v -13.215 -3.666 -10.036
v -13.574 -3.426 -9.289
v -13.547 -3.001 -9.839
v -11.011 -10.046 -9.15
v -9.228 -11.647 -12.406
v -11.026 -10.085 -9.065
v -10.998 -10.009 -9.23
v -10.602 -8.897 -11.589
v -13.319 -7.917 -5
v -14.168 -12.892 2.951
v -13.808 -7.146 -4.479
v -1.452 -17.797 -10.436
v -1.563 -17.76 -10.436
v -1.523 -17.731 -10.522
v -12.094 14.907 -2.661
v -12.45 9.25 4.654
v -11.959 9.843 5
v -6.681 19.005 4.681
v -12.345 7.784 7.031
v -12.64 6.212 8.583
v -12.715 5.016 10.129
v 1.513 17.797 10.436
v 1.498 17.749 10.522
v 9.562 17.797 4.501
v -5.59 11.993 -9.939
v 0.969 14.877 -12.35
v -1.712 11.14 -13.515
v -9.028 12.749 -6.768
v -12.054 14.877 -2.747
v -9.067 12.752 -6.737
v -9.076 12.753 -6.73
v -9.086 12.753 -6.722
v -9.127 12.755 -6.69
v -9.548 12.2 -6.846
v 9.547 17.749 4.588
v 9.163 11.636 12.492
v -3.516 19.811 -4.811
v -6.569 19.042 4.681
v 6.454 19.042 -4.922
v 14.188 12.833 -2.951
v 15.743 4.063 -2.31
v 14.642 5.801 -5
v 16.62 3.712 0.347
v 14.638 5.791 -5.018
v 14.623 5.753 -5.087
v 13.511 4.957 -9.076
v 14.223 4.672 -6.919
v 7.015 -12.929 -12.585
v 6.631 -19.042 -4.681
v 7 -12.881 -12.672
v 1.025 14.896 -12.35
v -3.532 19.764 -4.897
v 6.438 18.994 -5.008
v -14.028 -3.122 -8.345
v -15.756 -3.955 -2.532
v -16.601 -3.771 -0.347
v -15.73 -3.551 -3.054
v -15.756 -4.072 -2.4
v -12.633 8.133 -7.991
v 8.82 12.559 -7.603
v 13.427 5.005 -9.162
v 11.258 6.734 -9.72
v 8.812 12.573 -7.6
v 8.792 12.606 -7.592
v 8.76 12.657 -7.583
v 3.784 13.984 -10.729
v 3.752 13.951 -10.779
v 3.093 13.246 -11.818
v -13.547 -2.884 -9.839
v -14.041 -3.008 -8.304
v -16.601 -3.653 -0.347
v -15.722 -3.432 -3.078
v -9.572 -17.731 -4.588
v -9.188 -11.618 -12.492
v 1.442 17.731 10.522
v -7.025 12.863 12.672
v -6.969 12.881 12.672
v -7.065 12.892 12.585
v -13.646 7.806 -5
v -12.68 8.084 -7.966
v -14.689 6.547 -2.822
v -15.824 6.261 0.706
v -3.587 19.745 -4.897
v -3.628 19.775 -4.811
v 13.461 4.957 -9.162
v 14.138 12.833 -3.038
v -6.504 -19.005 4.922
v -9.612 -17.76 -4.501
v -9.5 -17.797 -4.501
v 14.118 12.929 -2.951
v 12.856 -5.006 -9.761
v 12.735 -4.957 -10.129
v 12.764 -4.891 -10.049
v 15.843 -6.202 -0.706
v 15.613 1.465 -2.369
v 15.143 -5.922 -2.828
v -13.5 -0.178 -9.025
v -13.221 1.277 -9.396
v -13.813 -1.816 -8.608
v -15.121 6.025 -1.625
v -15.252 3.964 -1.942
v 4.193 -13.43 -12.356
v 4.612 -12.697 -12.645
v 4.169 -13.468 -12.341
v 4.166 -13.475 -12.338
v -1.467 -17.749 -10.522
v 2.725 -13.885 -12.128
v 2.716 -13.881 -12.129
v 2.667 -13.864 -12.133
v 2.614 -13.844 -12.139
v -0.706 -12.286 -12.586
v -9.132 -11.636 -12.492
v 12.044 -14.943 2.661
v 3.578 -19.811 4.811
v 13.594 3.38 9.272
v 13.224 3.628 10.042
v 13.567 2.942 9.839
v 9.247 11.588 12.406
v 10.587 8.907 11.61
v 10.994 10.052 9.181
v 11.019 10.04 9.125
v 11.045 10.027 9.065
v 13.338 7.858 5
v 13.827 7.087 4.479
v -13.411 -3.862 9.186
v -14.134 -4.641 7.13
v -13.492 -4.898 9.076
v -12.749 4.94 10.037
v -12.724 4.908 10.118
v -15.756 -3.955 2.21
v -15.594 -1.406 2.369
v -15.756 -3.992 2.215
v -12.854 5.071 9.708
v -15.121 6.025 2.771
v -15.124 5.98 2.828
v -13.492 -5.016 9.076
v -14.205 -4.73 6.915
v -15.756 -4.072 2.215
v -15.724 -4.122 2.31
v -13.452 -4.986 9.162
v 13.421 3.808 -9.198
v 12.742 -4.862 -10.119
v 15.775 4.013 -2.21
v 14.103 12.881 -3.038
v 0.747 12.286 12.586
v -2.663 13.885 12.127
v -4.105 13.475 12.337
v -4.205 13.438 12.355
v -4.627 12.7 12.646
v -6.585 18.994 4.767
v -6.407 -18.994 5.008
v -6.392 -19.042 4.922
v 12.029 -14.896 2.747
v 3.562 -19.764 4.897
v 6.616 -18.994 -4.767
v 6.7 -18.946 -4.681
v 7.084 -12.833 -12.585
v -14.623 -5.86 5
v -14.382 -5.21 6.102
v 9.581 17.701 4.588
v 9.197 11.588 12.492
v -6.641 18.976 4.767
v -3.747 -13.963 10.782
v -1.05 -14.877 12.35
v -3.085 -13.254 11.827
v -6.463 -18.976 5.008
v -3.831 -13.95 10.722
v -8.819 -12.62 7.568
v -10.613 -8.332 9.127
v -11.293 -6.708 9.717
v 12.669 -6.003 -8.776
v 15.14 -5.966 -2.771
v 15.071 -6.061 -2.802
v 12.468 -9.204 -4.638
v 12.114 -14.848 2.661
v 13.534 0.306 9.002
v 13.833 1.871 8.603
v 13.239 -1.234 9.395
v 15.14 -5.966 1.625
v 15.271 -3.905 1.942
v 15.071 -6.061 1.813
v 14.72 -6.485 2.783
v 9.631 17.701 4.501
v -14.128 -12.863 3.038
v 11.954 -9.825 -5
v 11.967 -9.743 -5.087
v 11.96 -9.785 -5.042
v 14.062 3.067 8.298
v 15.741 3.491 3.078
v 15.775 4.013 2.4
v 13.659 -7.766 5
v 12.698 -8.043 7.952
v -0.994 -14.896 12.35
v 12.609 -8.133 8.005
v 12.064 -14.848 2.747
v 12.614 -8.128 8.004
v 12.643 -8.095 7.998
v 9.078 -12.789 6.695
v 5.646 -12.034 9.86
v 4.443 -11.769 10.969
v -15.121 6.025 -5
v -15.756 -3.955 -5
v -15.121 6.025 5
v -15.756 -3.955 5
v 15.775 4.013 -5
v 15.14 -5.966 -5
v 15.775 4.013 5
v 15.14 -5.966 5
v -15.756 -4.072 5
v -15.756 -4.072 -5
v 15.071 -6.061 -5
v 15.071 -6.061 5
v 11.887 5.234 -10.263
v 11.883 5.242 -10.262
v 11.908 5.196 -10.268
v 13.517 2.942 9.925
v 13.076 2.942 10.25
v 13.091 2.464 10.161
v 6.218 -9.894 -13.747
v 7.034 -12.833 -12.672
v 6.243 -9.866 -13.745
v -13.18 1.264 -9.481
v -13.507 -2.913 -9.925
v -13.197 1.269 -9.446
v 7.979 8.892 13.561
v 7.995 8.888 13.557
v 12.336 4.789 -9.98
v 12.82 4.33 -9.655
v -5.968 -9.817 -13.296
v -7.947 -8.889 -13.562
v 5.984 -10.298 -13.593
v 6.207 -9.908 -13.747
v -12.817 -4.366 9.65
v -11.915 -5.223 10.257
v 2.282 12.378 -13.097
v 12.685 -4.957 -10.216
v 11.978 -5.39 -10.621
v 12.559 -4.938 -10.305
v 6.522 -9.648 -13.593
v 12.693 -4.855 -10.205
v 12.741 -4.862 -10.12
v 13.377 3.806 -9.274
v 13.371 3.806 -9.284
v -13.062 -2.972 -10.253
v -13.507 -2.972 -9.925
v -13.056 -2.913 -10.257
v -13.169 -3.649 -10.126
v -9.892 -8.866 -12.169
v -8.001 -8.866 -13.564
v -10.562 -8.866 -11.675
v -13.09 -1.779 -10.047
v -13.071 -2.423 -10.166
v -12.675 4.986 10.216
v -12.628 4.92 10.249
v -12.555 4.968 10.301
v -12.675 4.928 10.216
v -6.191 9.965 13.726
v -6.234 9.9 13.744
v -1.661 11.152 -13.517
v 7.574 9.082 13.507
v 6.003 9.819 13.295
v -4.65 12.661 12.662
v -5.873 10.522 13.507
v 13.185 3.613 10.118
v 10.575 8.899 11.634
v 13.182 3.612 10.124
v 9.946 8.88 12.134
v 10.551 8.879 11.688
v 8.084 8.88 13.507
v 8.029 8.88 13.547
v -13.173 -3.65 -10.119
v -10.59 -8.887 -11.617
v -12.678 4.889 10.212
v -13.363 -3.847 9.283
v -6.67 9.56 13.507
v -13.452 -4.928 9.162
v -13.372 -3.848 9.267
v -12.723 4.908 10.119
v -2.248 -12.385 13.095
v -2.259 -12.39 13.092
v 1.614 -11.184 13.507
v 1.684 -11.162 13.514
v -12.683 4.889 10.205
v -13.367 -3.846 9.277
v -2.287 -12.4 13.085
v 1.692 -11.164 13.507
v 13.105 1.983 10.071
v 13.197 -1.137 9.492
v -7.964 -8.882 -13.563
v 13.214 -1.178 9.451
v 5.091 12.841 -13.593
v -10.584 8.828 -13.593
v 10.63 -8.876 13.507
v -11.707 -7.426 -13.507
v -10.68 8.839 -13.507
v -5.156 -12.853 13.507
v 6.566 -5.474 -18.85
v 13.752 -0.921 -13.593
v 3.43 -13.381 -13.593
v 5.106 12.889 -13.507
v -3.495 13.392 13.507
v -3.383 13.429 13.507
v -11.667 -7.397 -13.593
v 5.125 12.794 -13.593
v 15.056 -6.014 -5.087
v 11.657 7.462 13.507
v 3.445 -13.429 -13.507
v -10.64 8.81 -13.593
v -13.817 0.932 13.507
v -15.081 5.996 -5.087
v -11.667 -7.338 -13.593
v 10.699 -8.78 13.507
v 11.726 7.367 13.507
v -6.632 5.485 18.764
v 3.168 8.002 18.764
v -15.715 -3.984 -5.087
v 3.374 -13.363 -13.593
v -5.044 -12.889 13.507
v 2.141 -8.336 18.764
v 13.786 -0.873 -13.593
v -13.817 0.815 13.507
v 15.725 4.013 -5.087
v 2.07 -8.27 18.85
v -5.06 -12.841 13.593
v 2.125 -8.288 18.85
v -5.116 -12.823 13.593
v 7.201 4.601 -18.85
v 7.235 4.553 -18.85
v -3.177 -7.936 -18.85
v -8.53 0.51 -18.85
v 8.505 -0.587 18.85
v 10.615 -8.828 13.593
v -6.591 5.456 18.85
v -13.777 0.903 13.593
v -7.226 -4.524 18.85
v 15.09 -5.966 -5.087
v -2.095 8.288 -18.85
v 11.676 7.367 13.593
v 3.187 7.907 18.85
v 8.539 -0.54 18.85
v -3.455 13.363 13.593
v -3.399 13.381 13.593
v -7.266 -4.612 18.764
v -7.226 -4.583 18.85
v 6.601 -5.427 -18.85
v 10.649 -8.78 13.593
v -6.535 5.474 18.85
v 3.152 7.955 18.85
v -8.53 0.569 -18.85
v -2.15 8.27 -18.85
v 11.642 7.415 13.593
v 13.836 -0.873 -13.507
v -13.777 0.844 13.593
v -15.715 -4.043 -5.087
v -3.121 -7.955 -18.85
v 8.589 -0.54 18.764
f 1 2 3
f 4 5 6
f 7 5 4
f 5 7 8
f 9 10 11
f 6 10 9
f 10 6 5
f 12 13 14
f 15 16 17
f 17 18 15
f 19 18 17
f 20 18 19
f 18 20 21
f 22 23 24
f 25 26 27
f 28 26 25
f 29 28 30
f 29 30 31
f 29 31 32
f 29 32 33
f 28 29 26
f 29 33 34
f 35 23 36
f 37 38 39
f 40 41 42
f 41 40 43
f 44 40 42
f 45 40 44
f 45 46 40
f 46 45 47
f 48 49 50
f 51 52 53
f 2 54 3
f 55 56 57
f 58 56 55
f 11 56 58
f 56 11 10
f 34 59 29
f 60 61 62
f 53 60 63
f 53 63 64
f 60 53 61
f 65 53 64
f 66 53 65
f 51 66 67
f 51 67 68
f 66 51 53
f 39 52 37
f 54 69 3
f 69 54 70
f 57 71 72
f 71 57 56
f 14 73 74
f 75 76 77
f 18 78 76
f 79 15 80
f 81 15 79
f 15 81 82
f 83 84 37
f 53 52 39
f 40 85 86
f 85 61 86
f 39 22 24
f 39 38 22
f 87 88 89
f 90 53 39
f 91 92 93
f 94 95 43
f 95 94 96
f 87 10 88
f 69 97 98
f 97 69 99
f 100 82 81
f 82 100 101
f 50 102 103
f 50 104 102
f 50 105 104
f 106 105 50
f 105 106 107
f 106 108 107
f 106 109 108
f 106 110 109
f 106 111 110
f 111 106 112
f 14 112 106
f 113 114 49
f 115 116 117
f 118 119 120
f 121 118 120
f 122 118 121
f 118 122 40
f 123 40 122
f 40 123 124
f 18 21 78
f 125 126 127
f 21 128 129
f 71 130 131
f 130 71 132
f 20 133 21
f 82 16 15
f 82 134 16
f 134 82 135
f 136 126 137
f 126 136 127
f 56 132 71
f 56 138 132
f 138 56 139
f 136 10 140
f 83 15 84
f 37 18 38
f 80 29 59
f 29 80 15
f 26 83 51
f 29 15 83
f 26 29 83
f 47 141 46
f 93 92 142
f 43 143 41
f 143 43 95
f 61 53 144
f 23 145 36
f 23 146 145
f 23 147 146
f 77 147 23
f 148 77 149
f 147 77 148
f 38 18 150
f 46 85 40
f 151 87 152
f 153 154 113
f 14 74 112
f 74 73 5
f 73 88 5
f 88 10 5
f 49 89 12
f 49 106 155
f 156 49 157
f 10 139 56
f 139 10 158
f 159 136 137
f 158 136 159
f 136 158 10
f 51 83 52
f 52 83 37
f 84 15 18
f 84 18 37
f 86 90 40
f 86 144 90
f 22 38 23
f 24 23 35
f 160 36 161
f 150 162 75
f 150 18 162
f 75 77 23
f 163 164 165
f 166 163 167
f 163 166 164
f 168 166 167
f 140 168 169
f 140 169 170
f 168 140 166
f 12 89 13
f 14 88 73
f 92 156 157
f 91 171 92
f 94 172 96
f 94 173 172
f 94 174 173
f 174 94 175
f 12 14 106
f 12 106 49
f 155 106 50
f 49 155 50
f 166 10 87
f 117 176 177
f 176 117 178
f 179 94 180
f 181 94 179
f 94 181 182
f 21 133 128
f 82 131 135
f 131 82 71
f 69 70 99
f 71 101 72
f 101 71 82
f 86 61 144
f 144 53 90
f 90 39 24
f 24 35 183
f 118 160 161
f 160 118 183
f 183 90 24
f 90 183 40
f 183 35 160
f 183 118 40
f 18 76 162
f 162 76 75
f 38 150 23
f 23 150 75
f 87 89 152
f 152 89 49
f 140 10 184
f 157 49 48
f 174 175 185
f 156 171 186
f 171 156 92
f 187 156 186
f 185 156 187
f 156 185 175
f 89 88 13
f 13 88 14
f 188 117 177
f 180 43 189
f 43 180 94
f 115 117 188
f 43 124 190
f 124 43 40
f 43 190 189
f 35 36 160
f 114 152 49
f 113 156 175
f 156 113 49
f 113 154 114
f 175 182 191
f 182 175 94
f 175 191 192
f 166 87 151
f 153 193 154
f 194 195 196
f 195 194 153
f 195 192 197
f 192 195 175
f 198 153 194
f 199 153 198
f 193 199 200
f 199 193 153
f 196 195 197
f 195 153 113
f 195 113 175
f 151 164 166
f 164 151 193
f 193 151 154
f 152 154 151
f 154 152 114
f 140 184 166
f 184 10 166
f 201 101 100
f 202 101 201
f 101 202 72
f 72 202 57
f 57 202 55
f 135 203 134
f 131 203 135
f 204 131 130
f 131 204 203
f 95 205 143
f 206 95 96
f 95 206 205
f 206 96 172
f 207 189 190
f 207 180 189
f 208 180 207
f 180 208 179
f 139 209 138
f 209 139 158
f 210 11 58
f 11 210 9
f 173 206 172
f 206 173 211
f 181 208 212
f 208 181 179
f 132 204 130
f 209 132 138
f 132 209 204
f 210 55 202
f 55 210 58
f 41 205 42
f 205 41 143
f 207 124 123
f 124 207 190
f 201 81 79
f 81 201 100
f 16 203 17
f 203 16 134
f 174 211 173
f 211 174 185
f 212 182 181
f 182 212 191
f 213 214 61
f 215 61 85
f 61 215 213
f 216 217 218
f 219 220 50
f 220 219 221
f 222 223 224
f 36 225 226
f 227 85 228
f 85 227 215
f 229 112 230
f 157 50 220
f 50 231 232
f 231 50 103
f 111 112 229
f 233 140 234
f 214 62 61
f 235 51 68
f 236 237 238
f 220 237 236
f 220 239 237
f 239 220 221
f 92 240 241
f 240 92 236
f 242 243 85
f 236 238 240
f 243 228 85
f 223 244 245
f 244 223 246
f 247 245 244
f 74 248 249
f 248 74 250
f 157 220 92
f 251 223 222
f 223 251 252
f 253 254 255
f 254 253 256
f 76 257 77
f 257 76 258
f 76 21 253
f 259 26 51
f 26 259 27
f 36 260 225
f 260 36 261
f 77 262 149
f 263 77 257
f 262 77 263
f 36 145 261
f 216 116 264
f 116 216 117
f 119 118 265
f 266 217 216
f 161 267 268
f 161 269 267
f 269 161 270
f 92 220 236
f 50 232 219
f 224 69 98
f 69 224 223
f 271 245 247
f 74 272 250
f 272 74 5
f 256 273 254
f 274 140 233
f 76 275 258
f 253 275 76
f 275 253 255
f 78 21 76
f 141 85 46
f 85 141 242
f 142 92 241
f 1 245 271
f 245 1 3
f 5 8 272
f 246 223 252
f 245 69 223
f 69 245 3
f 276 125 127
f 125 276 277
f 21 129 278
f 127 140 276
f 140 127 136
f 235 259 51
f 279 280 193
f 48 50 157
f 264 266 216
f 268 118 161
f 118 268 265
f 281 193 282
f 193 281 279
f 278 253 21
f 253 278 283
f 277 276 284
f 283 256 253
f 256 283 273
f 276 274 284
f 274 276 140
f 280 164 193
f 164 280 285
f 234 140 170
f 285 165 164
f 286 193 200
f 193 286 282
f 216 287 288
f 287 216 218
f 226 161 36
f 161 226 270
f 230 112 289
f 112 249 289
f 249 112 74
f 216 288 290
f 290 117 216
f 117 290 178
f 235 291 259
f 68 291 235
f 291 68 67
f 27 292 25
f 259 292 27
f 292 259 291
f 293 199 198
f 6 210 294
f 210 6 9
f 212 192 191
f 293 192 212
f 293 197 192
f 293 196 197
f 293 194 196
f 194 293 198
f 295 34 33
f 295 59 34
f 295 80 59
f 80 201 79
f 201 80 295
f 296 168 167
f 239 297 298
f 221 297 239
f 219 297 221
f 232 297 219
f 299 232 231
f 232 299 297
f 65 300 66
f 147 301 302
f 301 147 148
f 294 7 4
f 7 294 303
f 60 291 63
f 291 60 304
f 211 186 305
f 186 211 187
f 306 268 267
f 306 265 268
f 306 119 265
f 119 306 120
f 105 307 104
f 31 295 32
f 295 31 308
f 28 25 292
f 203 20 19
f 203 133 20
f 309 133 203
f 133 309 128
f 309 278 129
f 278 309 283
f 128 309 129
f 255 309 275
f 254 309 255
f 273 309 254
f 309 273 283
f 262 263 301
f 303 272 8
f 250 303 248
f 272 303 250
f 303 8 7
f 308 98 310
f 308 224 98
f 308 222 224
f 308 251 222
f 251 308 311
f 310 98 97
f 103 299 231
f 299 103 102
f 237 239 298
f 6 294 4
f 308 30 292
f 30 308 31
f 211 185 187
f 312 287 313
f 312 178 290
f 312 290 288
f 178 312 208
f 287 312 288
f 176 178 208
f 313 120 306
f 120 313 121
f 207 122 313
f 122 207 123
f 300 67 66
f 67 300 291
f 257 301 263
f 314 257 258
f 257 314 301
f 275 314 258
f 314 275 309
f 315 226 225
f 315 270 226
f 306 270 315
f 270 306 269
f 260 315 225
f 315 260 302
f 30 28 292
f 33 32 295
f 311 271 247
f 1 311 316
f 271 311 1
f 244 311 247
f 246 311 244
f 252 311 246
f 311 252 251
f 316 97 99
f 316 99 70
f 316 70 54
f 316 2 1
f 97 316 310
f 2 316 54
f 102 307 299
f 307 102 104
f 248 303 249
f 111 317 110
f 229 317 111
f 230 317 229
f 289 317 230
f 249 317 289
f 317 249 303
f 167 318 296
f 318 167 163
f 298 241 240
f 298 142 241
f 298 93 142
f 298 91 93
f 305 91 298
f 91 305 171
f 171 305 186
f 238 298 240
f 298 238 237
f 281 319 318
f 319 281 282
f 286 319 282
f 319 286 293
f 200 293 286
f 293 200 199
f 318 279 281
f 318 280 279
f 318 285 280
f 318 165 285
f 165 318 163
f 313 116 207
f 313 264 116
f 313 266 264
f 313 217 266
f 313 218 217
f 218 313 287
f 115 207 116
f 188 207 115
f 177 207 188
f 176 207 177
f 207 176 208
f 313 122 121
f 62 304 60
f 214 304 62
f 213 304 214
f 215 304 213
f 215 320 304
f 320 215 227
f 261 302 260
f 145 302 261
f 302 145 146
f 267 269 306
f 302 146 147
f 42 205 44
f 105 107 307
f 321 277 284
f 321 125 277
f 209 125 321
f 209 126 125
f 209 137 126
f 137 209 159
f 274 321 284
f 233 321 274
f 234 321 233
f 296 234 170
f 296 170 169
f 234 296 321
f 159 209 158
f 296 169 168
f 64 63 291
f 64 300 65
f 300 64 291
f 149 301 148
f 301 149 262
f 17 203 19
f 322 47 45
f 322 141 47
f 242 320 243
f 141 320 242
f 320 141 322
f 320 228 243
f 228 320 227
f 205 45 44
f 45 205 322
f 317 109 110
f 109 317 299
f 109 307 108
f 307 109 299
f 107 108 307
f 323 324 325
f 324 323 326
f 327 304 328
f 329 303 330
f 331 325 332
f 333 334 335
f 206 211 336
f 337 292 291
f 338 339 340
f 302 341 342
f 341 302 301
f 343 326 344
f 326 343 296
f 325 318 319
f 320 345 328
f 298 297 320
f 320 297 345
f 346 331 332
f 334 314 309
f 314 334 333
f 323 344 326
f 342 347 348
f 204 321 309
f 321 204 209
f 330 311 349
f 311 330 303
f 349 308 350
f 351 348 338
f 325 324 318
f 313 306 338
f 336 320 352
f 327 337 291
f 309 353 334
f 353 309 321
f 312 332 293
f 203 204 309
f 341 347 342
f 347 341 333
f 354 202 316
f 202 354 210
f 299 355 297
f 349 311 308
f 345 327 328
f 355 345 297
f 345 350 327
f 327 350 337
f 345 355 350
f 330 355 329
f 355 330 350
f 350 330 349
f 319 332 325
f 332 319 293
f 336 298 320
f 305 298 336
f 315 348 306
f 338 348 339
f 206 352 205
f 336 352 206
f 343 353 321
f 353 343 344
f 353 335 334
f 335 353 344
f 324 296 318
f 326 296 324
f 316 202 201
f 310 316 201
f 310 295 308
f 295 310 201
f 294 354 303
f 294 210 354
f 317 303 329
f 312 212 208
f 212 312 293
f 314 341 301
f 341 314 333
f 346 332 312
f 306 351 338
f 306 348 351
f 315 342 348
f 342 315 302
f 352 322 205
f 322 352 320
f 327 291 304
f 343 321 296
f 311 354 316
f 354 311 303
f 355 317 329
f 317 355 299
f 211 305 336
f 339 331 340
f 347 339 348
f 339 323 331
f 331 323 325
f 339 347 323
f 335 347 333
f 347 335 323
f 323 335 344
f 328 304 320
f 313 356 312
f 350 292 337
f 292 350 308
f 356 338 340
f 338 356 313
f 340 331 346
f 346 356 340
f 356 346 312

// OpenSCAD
// Auto-generated OpenSCAD file

    inner_points = 10*[[-0.10267110435699114, -1.6147732450963963, 0.5000000000008641], [-0.1026711043570435, -1.6147732450969283, -0.4999999999991359], [0.1026711043570435, 1.6147732450969283, 0.4999999999991359], [0.10267110435699114, 1.6147732450963963, -0.5000000000008641], [0.8660772310082325, -1.3667275583225522, 0.5000000000006815], [0.8660772310081802, -1.3667275583230845, -0.4999999999993185], [-1.0322025675203217, -1.2460304363672796, 0.5000000000007166], [-1.032202567520374, -1.2460304363678119, -0.49999999999928335], [1.032202567520374, 1.2460304363678119, 0.49999999999928335], [1.0322025675203217, 1.2460304363672796, -0.5000000000007166], [-0.8660772310081802, 1.3667275583230845, 0.4999999999993185], [-0.8660772310082325, 1.3667275583225522, -0.5000000000006815], [1.504013501010716, -0.596638397630546, 0.5000000000002386], [1.5040135010106637, -0.5966383976310778, -0.4999999999997614], [-1.5674677331657878, -0.40134635196262397, 0.5000000000002954], [-1.5674677331658402, -0.4013463519631557, -0.4999999999997045], [1.5674677331658402, 0.4013463519631557, 0.4999999999997045], [1.5674677331657878, 0.40134635196262397, -0.5000000000002954], [-1.5040135010106637, 0.5966383976310778, 0.4999999999997614], [-1.504013501010716, 0.596638397630546, -0.5000000000002386], [0.2110002639625055, -0.8240665545671229, 1.8763819204716008], [-0.3136713683195228, -0.7907066905295395, -1.8763819204707366], [0.3136713683195228, 0.7907066905295395, 1.8763819204707366], [-0.2110002639625055, 0.8240665545671229, -1.8763819204716008], [-0.718531199200825, -0.4553237458380063, 1.8763819204714534], [0.6550769670457008, -0.5426610037556955, -1.8763819204709191], [-0.6550769670457008, 0.5426610037556955, 1.8763819204709191], [0.718531199200825, 0.4553237458380063, -1.8763819204714534], [0.8489365339649888, -0.05397739387511649, 1.8763819204711578], [-0.8489365339649888, 0.05397739387511649, -1.8763819204711578], [-0.5075309352384453, -1.2793903004064069, 1.3506508083527466], [0.3414055987263038, -1.3333676942839572, -1.3506508083513487], [-0.3414055987263038, 1.3333676942839572, 1.3506508083513487], [0.5075309352384453, 1.2793903004064069, -1.3506508083527466], [1.0599367979273688, -0.8780439484435167, 1.3506508083524513], [-1.162607902284386, -0.7367292966531456, -1.3506508083515871], [1.162607902284386, 0.7367292966531456, 1.3506508083515871], [-1.0599367979273688, 0.8780439484435167, -1.3506508083524513], [-1.3736081662466517, 0.0873372579164117, 1.3506508083520654], [1.3736081662466517, -0.0873372579164117, -1.3506508083520654]];

    outer_points = 10*[[1.3411441290868589, 0.49569687647638716, -0.9075522136038779], [1.263452202904808, -0.49569687647638716, -1.0129200987128433], [-1.263452202904808, 0.49569687647638716, 1.0129200987128433], [-1.3411441290868589, -0.49569687647638716, 0.9075522136038779], [0.5328721345308199, 0.6202033120279035, -1.4830472442710922], [0.45518020834876893, -0.3711904409248708, -1.5884151293800577], [1.6519824877191422, 0.3711904409248708, 0.034720391489278635], [1.574290561537091, -0.6202033120279035, -0.0706474936196867], [-1.574290561537091, 0.6202033120279035, 0.0706474936196867], [-1.6519824877191422, -0.3711904409248708, -0.034720391489278635], [-0.45518020834876893, 0.3711904409248708, 1.5884151293800577], [-0.5328721345308199, -0.6202033120279035, 1.4830472442710922], [-0.4641010661832383, 0.6971525210168389, -1.4719451591541524], [-0.5417929923652892, -0.29424123193593543, -1.5773130442631174], [1.3466575224373667, 0.29424123193593543, 0.983854462530699], [1.268965596255316, -0.6971525210168389, 0.8784865774217337], [-1.268965596255316, 0.6971525210168389, -0.8784865774217337], [-1.3466575224373667, -0.29424123193593543, -0.983854462530699], [0.5417929923652892, 0.29424123193593543, 1.5773130442631174], [0.4641010661832383, -0.6971525210168389, 1.4719451591541524], [0.642271561558062, 1.8946460465314703, -0.49215801202206017], [0.6600266044377715, -1.8946460465314703, -0.4680781441363005], [-0.6600266044377715, 1.8946460465314703, 0.4680781441363005], [-0.642271561558062, -1.8946460465314703, 0.49215801202206017], [0.9531099201903453, 1.770139610979954, 0.4501145930710967], [-0.14824539011826776, -1.770139610979954, -1.043573174803515], [0.14824539011826776, 1.770139610979954, 1.043573174803515], [-0.9531099201903453, -1.770139610979954, -0.4501145930710967], [-0.3547016391559959, 1.9715952555204057, -0.4810559269051196], [0.3547016391559959, -1.9715952555204057, 0.4810559269051196], [1.4087566933394584, 1.2833458031149498, -0.29514898898768743], [0.6984060027284527, -1.2833458031149498, -1.2585457489030916], [-0.6984060027284527, 1.2833458031149498, 1.2585457489030916], [-1.4087566933394584, -1.2833458031149498, 0.29514898898768743], [0.10094513399311722, 1.4848014476554017, -1.2263195089639038], [1.2013530320027161, -1.4848014476554017, 0.2660833528055431], [-1.2013530320027161, 1.4848014476554017, -0.2660833528055431], [-0.10094513399311722, -1.4848014476554017, 1.2263195089639038], [0.9147305218996641, 1.1588393675634334, 1.2405821978378877], [-0.9147305218996641, -1.1588393675634334, -1.2405821978378877]];

    // Convex hull for inner set (I)
    module inner_hull() {
        hull() {
            for (p = inner_points) {
                translate(p) sphere(r=0.1);
            }
        }
    }

    // Convex hull for outer set (O) minus inner hull (O \ I)
    module outer_minus_inner() {
        difference() {
            hull() {
                for (p = outer_points) {
                    translate(p) sphere(r=0.1);
                }
            }
            inner_hull(); // Subtract inner hull
        }
    }

    // Convex hull for outer set (O) minus all translated inner hulls
    module outer_minus_AllTranslationInner() {
        difference() {
            hull() {
                for (p = outer_points) {
                    translate(p) sphere(r=0.1);
                }
            }
            hull() {
                translate([0,0,50]) inner_hull();
                translate([0,0,-50]) inner_hull();
            }; // Subtract translated inner hulls
        }
    }

    // Difference between outer_minus_inner and outer_minus_AllTranslationInner
    module outer_minus_inner_diff() {
        difference() {
            // Outer minus inner
            difference() {
                hull() {
                    for (p = outer_points) {
                        translate(p) sphere(r=0.1);
                    }
                }
                inner_hull();
            }

            // Subtract Outer minus AllTranslationInner
            difference() {
                hull() {
                    for (p = outer_points) {
                        translate(p) sphere(r=0.1);
                    }
                }
                hull() {
                    translate([0,0,50]) inner_hull();
                    translate([0,0,-50]) inner_hull();
                };
            }
        }
    }

    // Rendering all with colors applied
    color([1, 0, 0, 0.5]) inner_hull(); // Transparent red
    color([0, 1, 0, 1]) outer_minus_AllTranslationInner(); // Opaque green
    color([1, 1, 0, 1]) outer_minus_inner_diff(); // Opaque yellow
    
